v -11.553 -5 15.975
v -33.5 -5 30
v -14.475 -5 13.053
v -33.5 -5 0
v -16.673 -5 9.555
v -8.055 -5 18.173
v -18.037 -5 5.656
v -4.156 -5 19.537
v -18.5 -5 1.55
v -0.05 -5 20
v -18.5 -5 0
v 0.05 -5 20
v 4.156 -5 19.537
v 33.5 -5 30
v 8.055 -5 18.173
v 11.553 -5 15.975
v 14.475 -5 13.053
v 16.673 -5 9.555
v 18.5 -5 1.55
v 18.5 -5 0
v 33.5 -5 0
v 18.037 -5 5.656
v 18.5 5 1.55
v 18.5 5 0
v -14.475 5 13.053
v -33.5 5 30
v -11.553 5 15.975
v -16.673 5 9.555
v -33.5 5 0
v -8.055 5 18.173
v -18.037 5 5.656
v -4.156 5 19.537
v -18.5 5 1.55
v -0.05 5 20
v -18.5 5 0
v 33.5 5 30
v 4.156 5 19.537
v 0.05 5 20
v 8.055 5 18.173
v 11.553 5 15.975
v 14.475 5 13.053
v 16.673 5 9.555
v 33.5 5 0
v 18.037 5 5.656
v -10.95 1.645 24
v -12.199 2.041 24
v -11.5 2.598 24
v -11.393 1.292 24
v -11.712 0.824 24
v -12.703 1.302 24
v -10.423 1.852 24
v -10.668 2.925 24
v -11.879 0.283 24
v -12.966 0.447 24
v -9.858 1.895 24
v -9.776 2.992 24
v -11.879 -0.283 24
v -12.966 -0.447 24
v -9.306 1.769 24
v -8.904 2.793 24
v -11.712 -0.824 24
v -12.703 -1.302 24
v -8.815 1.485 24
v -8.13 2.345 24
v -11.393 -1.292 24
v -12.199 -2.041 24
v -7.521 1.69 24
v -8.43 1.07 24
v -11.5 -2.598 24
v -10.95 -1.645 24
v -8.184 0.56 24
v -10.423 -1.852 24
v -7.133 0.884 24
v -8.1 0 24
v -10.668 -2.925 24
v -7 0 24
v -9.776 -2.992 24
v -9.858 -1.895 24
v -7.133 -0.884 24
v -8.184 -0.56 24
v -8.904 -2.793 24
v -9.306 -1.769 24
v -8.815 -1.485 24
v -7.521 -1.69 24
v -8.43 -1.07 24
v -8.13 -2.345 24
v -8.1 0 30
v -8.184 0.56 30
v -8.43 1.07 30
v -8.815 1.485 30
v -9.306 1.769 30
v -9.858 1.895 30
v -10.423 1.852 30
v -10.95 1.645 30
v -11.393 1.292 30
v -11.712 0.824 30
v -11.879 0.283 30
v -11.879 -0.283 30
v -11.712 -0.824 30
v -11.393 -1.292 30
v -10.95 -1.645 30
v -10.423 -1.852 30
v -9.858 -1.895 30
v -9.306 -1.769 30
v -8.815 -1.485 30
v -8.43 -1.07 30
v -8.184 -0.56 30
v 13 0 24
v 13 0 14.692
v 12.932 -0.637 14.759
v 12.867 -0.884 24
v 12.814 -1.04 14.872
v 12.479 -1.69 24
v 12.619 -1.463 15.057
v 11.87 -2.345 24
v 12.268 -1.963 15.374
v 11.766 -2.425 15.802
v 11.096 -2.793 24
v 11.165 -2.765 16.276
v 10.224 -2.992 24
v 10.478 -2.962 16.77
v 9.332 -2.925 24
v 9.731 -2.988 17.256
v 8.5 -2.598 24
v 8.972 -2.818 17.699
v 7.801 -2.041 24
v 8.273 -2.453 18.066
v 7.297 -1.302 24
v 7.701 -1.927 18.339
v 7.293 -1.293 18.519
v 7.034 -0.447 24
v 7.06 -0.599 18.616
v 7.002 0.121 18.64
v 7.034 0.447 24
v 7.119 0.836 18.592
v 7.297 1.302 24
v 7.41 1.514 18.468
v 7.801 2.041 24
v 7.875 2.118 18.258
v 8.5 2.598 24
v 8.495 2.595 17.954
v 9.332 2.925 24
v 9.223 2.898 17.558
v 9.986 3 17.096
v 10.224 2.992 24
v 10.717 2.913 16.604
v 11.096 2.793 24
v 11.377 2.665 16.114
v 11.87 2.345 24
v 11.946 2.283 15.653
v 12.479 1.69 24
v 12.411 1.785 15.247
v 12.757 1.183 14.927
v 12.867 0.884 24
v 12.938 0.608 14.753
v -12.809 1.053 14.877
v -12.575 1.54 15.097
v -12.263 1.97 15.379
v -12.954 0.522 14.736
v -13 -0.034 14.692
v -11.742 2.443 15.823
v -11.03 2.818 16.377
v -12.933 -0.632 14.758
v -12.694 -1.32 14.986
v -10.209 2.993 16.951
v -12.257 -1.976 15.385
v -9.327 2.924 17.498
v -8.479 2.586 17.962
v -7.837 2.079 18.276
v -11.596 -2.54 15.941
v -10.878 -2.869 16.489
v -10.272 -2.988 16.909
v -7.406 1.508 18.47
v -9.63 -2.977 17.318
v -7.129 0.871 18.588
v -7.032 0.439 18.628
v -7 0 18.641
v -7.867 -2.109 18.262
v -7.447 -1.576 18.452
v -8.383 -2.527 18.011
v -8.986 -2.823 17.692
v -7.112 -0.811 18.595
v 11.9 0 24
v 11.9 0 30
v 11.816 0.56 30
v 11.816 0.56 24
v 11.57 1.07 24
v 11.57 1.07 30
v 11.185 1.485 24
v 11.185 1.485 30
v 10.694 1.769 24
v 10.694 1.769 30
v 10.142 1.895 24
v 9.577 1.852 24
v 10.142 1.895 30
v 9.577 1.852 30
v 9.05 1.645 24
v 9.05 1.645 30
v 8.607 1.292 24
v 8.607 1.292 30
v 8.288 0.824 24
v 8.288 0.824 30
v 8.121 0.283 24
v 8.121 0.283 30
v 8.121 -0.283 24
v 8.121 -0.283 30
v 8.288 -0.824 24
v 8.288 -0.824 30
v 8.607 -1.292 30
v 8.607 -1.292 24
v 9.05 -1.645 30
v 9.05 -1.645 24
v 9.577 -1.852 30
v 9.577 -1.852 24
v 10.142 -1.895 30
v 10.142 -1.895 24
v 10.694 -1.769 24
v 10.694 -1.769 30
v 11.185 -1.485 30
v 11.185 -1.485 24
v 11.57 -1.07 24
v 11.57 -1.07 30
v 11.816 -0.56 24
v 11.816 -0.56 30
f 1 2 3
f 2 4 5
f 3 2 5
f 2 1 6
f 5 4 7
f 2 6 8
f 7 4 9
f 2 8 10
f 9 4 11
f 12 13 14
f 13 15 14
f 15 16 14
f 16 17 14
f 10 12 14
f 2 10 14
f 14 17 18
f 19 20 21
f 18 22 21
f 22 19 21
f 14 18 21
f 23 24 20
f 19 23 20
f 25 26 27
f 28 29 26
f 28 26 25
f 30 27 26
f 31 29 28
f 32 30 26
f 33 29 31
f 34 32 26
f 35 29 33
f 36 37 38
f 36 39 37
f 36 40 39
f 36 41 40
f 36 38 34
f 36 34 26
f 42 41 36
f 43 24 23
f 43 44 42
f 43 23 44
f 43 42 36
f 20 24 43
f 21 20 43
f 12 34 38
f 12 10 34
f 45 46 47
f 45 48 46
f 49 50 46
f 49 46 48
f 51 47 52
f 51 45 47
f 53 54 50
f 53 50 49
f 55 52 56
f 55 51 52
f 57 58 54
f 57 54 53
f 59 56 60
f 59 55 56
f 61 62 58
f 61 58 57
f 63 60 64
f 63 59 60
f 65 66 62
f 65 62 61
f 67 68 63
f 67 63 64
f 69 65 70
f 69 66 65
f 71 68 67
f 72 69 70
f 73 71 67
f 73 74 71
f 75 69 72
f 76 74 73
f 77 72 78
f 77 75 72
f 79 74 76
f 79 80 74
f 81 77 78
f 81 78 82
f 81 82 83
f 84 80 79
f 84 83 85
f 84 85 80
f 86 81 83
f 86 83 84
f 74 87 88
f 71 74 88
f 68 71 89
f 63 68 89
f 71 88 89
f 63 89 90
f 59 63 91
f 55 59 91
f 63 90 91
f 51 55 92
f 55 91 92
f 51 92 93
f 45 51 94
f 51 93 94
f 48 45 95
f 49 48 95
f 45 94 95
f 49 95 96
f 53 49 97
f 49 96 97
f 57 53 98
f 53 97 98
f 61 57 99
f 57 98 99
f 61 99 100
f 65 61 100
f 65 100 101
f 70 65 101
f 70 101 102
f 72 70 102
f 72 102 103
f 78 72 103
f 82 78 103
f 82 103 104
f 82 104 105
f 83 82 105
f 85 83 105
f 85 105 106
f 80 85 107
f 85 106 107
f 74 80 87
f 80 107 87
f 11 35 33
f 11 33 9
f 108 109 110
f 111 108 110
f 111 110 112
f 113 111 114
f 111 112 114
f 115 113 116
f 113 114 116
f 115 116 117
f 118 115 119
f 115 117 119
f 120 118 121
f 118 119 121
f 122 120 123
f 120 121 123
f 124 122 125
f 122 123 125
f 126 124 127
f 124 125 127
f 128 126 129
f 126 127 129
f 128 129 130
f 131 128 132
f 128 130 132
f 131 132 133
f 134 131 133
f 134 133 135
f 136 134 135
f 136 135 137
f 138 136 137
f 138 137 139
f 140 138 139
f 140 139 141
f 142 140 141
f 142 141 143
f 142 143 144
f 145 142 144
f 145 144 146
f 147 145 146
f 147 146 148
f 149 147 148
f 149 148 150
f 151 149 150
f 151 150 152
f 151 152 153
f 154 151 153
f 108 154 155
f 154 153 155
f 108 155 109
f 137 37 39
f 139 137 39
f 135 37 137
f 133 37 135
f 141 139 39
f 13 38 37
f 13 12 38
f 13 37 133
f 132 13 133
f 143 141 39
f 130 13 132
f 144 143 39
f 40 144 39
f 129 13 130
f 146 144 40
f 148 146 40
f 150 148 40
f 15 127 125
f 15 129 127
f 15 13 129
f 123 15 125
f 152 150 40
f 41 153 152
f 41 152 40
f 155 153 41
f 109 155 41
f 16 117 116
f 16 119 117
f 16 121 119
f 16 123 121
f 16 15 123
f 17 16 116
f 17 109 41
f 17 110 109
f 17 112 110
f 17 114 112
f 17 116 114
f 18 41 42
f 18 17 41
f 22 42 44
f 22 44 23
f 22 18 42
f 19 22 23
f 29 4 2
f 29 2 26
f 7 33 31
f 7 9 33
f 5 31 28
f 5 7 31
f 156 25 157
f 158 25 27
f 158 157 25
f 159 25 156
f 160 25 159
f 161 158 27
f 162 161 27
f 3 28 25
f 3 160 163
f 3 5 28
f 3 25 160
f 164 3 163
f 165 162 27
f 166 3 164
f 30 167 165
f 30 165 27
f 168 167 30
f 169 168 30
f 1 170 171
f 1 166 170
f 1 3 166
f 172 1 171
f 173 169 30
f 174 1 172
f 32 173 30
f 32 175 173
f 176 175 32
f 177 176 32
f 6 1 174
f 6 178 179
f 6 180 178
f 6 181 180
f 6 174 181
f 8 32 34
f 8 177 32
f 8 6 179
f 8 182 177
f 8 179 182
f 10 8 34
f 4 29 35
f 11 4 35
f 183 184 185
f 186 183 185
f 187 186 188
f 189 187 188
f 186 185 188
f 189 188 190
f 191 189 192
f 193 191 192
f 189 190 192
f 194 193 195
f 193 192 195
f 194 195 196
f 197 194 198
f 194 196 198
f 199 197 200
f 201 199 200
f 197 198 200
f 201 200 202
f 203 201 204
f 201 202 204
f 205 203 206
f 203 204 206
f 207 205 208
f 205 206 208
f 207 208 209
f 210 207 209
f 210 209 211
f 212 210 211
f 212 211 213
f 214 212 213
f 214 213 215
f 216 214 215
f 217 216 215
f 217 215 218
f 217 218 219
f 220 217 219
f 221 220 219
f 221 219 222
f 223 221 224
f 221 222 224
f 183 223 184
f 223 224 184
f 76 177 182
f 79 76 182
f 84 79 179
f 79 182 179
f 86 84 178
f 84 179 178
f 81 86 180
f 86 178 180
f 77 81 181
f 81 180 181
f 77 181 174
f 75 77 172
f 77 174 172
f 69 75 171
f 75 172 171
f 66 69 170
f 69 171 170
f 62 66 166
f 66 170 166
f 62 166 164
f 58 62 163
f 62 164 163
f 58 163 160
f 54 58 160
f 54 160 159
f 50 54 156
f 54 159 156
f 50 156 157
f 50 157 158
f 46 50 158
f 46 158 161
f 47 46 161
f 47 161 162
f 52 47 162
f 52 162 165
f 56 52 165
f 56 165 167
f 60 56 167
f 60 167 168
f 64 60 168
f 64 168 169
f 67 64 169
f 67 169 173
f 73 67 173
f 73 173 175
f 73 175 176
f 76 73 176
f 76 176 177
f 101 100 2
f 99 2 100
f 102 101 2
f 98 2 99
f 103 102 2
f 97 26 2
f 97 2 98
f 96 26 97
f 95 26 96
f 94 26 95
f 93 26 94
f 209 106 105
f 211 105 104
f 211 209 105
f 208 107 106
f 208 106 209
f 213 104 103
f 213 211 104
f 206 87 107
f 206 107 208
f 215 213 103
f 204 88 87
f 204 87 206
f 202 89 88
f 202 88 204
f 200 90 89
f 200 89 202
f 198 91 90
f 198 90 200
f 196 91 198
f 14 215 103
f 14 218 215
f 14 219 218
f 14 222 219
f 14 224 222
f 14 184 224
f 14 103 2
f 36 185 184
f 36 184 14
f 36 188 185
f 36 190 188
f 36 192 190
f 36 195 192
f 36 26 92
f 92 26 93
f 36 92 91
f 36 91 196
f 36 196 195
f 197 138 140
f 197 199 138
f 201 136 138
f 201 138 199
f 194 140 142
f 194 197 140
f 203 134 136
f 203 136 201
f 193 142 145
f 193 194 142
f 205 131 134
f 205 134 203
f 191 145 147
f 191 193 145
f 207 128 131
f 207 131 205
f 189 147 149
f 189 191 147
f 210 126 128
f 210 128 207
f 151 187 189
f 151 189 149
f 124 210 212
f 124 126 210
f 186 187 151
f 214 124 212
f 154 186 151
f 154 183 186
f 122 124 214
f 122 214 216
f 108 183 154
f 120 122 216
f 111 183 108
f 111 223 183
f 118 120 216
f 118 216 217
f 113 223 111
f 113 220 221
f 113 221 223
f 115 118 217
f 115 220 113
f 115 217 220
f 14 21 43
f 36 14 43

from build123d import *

# Parameters (mm, degrees)
SKETCH_W        = 67
SKETCH_H        = 10
PAD_DEPTH       = 30
SKETCH001_W     = 37
SKETCH001_H     = 10
POCKET_DEPTH    = 20
FILLET_R        = 18.45
SKETCH002_R     = 3
POCKET001_DEPTH = 24
SKETCH003_R     = 1.9
POCKET002_DEPTH = 6


with BuildPart() as part:
    # Sketch → Pad (new body)
    with BuildSketch(Plane.XY):
        Rectangle(SKETCH_W, SKETCH_H)
    extrude(amount=PAD_DEPTH)

    # Sketch001 (on Face5 of Pad) → Pocket (cut)
    with BuildSketch(Plane(origin=(0, 0, 0), x_dir=(1, 0, 0), z_dir=(0, 0, -1))):
        Rectangle(SKETCH001_W, SKETCH001_H)
    extrude(amount=-POCKET_DEPTH, mode=Mode.SUBTRACT)

    # Fillet
    fillet_edges = [part.edges().sort_by_distance(p)[0] for p in [
        (-18.5, 0, 20),
        (18.5, 0, 20),
    ]]
    fillet(fillet_edges, radius=FILLET_R)

    # Sketch002 (on Face4 of Fillet) → Pocket001 (cut)
    with BuildSketch(Plane(origin=(0, 0, 0), x_dir=(1, 0, 0), z_dir=(0, 0, -1))):
        with Locations((-10, 0)):
            Circle(SKETCH002_R)
        with Locations((10, 0)):
            Circle(SKETCH002_R)
    extrude(amount=-POCKET001_DEPTH, mode=Mode.SUBTRACT)

    # Sketch003 (on Face8 of Pocket001) → Pocket002 (cut)
    with BuildSketch(Plane.XY.offset(30)):
        with Locations((-10, 0)):
            Circle(SKETCH003_R)
        with Locations((10, 0)):
            Circle(SKETCH003_R)
    extrude(amount=-POCKET002_DEPTH, mode=Mode.SUBTRACT)


solid = part.part
